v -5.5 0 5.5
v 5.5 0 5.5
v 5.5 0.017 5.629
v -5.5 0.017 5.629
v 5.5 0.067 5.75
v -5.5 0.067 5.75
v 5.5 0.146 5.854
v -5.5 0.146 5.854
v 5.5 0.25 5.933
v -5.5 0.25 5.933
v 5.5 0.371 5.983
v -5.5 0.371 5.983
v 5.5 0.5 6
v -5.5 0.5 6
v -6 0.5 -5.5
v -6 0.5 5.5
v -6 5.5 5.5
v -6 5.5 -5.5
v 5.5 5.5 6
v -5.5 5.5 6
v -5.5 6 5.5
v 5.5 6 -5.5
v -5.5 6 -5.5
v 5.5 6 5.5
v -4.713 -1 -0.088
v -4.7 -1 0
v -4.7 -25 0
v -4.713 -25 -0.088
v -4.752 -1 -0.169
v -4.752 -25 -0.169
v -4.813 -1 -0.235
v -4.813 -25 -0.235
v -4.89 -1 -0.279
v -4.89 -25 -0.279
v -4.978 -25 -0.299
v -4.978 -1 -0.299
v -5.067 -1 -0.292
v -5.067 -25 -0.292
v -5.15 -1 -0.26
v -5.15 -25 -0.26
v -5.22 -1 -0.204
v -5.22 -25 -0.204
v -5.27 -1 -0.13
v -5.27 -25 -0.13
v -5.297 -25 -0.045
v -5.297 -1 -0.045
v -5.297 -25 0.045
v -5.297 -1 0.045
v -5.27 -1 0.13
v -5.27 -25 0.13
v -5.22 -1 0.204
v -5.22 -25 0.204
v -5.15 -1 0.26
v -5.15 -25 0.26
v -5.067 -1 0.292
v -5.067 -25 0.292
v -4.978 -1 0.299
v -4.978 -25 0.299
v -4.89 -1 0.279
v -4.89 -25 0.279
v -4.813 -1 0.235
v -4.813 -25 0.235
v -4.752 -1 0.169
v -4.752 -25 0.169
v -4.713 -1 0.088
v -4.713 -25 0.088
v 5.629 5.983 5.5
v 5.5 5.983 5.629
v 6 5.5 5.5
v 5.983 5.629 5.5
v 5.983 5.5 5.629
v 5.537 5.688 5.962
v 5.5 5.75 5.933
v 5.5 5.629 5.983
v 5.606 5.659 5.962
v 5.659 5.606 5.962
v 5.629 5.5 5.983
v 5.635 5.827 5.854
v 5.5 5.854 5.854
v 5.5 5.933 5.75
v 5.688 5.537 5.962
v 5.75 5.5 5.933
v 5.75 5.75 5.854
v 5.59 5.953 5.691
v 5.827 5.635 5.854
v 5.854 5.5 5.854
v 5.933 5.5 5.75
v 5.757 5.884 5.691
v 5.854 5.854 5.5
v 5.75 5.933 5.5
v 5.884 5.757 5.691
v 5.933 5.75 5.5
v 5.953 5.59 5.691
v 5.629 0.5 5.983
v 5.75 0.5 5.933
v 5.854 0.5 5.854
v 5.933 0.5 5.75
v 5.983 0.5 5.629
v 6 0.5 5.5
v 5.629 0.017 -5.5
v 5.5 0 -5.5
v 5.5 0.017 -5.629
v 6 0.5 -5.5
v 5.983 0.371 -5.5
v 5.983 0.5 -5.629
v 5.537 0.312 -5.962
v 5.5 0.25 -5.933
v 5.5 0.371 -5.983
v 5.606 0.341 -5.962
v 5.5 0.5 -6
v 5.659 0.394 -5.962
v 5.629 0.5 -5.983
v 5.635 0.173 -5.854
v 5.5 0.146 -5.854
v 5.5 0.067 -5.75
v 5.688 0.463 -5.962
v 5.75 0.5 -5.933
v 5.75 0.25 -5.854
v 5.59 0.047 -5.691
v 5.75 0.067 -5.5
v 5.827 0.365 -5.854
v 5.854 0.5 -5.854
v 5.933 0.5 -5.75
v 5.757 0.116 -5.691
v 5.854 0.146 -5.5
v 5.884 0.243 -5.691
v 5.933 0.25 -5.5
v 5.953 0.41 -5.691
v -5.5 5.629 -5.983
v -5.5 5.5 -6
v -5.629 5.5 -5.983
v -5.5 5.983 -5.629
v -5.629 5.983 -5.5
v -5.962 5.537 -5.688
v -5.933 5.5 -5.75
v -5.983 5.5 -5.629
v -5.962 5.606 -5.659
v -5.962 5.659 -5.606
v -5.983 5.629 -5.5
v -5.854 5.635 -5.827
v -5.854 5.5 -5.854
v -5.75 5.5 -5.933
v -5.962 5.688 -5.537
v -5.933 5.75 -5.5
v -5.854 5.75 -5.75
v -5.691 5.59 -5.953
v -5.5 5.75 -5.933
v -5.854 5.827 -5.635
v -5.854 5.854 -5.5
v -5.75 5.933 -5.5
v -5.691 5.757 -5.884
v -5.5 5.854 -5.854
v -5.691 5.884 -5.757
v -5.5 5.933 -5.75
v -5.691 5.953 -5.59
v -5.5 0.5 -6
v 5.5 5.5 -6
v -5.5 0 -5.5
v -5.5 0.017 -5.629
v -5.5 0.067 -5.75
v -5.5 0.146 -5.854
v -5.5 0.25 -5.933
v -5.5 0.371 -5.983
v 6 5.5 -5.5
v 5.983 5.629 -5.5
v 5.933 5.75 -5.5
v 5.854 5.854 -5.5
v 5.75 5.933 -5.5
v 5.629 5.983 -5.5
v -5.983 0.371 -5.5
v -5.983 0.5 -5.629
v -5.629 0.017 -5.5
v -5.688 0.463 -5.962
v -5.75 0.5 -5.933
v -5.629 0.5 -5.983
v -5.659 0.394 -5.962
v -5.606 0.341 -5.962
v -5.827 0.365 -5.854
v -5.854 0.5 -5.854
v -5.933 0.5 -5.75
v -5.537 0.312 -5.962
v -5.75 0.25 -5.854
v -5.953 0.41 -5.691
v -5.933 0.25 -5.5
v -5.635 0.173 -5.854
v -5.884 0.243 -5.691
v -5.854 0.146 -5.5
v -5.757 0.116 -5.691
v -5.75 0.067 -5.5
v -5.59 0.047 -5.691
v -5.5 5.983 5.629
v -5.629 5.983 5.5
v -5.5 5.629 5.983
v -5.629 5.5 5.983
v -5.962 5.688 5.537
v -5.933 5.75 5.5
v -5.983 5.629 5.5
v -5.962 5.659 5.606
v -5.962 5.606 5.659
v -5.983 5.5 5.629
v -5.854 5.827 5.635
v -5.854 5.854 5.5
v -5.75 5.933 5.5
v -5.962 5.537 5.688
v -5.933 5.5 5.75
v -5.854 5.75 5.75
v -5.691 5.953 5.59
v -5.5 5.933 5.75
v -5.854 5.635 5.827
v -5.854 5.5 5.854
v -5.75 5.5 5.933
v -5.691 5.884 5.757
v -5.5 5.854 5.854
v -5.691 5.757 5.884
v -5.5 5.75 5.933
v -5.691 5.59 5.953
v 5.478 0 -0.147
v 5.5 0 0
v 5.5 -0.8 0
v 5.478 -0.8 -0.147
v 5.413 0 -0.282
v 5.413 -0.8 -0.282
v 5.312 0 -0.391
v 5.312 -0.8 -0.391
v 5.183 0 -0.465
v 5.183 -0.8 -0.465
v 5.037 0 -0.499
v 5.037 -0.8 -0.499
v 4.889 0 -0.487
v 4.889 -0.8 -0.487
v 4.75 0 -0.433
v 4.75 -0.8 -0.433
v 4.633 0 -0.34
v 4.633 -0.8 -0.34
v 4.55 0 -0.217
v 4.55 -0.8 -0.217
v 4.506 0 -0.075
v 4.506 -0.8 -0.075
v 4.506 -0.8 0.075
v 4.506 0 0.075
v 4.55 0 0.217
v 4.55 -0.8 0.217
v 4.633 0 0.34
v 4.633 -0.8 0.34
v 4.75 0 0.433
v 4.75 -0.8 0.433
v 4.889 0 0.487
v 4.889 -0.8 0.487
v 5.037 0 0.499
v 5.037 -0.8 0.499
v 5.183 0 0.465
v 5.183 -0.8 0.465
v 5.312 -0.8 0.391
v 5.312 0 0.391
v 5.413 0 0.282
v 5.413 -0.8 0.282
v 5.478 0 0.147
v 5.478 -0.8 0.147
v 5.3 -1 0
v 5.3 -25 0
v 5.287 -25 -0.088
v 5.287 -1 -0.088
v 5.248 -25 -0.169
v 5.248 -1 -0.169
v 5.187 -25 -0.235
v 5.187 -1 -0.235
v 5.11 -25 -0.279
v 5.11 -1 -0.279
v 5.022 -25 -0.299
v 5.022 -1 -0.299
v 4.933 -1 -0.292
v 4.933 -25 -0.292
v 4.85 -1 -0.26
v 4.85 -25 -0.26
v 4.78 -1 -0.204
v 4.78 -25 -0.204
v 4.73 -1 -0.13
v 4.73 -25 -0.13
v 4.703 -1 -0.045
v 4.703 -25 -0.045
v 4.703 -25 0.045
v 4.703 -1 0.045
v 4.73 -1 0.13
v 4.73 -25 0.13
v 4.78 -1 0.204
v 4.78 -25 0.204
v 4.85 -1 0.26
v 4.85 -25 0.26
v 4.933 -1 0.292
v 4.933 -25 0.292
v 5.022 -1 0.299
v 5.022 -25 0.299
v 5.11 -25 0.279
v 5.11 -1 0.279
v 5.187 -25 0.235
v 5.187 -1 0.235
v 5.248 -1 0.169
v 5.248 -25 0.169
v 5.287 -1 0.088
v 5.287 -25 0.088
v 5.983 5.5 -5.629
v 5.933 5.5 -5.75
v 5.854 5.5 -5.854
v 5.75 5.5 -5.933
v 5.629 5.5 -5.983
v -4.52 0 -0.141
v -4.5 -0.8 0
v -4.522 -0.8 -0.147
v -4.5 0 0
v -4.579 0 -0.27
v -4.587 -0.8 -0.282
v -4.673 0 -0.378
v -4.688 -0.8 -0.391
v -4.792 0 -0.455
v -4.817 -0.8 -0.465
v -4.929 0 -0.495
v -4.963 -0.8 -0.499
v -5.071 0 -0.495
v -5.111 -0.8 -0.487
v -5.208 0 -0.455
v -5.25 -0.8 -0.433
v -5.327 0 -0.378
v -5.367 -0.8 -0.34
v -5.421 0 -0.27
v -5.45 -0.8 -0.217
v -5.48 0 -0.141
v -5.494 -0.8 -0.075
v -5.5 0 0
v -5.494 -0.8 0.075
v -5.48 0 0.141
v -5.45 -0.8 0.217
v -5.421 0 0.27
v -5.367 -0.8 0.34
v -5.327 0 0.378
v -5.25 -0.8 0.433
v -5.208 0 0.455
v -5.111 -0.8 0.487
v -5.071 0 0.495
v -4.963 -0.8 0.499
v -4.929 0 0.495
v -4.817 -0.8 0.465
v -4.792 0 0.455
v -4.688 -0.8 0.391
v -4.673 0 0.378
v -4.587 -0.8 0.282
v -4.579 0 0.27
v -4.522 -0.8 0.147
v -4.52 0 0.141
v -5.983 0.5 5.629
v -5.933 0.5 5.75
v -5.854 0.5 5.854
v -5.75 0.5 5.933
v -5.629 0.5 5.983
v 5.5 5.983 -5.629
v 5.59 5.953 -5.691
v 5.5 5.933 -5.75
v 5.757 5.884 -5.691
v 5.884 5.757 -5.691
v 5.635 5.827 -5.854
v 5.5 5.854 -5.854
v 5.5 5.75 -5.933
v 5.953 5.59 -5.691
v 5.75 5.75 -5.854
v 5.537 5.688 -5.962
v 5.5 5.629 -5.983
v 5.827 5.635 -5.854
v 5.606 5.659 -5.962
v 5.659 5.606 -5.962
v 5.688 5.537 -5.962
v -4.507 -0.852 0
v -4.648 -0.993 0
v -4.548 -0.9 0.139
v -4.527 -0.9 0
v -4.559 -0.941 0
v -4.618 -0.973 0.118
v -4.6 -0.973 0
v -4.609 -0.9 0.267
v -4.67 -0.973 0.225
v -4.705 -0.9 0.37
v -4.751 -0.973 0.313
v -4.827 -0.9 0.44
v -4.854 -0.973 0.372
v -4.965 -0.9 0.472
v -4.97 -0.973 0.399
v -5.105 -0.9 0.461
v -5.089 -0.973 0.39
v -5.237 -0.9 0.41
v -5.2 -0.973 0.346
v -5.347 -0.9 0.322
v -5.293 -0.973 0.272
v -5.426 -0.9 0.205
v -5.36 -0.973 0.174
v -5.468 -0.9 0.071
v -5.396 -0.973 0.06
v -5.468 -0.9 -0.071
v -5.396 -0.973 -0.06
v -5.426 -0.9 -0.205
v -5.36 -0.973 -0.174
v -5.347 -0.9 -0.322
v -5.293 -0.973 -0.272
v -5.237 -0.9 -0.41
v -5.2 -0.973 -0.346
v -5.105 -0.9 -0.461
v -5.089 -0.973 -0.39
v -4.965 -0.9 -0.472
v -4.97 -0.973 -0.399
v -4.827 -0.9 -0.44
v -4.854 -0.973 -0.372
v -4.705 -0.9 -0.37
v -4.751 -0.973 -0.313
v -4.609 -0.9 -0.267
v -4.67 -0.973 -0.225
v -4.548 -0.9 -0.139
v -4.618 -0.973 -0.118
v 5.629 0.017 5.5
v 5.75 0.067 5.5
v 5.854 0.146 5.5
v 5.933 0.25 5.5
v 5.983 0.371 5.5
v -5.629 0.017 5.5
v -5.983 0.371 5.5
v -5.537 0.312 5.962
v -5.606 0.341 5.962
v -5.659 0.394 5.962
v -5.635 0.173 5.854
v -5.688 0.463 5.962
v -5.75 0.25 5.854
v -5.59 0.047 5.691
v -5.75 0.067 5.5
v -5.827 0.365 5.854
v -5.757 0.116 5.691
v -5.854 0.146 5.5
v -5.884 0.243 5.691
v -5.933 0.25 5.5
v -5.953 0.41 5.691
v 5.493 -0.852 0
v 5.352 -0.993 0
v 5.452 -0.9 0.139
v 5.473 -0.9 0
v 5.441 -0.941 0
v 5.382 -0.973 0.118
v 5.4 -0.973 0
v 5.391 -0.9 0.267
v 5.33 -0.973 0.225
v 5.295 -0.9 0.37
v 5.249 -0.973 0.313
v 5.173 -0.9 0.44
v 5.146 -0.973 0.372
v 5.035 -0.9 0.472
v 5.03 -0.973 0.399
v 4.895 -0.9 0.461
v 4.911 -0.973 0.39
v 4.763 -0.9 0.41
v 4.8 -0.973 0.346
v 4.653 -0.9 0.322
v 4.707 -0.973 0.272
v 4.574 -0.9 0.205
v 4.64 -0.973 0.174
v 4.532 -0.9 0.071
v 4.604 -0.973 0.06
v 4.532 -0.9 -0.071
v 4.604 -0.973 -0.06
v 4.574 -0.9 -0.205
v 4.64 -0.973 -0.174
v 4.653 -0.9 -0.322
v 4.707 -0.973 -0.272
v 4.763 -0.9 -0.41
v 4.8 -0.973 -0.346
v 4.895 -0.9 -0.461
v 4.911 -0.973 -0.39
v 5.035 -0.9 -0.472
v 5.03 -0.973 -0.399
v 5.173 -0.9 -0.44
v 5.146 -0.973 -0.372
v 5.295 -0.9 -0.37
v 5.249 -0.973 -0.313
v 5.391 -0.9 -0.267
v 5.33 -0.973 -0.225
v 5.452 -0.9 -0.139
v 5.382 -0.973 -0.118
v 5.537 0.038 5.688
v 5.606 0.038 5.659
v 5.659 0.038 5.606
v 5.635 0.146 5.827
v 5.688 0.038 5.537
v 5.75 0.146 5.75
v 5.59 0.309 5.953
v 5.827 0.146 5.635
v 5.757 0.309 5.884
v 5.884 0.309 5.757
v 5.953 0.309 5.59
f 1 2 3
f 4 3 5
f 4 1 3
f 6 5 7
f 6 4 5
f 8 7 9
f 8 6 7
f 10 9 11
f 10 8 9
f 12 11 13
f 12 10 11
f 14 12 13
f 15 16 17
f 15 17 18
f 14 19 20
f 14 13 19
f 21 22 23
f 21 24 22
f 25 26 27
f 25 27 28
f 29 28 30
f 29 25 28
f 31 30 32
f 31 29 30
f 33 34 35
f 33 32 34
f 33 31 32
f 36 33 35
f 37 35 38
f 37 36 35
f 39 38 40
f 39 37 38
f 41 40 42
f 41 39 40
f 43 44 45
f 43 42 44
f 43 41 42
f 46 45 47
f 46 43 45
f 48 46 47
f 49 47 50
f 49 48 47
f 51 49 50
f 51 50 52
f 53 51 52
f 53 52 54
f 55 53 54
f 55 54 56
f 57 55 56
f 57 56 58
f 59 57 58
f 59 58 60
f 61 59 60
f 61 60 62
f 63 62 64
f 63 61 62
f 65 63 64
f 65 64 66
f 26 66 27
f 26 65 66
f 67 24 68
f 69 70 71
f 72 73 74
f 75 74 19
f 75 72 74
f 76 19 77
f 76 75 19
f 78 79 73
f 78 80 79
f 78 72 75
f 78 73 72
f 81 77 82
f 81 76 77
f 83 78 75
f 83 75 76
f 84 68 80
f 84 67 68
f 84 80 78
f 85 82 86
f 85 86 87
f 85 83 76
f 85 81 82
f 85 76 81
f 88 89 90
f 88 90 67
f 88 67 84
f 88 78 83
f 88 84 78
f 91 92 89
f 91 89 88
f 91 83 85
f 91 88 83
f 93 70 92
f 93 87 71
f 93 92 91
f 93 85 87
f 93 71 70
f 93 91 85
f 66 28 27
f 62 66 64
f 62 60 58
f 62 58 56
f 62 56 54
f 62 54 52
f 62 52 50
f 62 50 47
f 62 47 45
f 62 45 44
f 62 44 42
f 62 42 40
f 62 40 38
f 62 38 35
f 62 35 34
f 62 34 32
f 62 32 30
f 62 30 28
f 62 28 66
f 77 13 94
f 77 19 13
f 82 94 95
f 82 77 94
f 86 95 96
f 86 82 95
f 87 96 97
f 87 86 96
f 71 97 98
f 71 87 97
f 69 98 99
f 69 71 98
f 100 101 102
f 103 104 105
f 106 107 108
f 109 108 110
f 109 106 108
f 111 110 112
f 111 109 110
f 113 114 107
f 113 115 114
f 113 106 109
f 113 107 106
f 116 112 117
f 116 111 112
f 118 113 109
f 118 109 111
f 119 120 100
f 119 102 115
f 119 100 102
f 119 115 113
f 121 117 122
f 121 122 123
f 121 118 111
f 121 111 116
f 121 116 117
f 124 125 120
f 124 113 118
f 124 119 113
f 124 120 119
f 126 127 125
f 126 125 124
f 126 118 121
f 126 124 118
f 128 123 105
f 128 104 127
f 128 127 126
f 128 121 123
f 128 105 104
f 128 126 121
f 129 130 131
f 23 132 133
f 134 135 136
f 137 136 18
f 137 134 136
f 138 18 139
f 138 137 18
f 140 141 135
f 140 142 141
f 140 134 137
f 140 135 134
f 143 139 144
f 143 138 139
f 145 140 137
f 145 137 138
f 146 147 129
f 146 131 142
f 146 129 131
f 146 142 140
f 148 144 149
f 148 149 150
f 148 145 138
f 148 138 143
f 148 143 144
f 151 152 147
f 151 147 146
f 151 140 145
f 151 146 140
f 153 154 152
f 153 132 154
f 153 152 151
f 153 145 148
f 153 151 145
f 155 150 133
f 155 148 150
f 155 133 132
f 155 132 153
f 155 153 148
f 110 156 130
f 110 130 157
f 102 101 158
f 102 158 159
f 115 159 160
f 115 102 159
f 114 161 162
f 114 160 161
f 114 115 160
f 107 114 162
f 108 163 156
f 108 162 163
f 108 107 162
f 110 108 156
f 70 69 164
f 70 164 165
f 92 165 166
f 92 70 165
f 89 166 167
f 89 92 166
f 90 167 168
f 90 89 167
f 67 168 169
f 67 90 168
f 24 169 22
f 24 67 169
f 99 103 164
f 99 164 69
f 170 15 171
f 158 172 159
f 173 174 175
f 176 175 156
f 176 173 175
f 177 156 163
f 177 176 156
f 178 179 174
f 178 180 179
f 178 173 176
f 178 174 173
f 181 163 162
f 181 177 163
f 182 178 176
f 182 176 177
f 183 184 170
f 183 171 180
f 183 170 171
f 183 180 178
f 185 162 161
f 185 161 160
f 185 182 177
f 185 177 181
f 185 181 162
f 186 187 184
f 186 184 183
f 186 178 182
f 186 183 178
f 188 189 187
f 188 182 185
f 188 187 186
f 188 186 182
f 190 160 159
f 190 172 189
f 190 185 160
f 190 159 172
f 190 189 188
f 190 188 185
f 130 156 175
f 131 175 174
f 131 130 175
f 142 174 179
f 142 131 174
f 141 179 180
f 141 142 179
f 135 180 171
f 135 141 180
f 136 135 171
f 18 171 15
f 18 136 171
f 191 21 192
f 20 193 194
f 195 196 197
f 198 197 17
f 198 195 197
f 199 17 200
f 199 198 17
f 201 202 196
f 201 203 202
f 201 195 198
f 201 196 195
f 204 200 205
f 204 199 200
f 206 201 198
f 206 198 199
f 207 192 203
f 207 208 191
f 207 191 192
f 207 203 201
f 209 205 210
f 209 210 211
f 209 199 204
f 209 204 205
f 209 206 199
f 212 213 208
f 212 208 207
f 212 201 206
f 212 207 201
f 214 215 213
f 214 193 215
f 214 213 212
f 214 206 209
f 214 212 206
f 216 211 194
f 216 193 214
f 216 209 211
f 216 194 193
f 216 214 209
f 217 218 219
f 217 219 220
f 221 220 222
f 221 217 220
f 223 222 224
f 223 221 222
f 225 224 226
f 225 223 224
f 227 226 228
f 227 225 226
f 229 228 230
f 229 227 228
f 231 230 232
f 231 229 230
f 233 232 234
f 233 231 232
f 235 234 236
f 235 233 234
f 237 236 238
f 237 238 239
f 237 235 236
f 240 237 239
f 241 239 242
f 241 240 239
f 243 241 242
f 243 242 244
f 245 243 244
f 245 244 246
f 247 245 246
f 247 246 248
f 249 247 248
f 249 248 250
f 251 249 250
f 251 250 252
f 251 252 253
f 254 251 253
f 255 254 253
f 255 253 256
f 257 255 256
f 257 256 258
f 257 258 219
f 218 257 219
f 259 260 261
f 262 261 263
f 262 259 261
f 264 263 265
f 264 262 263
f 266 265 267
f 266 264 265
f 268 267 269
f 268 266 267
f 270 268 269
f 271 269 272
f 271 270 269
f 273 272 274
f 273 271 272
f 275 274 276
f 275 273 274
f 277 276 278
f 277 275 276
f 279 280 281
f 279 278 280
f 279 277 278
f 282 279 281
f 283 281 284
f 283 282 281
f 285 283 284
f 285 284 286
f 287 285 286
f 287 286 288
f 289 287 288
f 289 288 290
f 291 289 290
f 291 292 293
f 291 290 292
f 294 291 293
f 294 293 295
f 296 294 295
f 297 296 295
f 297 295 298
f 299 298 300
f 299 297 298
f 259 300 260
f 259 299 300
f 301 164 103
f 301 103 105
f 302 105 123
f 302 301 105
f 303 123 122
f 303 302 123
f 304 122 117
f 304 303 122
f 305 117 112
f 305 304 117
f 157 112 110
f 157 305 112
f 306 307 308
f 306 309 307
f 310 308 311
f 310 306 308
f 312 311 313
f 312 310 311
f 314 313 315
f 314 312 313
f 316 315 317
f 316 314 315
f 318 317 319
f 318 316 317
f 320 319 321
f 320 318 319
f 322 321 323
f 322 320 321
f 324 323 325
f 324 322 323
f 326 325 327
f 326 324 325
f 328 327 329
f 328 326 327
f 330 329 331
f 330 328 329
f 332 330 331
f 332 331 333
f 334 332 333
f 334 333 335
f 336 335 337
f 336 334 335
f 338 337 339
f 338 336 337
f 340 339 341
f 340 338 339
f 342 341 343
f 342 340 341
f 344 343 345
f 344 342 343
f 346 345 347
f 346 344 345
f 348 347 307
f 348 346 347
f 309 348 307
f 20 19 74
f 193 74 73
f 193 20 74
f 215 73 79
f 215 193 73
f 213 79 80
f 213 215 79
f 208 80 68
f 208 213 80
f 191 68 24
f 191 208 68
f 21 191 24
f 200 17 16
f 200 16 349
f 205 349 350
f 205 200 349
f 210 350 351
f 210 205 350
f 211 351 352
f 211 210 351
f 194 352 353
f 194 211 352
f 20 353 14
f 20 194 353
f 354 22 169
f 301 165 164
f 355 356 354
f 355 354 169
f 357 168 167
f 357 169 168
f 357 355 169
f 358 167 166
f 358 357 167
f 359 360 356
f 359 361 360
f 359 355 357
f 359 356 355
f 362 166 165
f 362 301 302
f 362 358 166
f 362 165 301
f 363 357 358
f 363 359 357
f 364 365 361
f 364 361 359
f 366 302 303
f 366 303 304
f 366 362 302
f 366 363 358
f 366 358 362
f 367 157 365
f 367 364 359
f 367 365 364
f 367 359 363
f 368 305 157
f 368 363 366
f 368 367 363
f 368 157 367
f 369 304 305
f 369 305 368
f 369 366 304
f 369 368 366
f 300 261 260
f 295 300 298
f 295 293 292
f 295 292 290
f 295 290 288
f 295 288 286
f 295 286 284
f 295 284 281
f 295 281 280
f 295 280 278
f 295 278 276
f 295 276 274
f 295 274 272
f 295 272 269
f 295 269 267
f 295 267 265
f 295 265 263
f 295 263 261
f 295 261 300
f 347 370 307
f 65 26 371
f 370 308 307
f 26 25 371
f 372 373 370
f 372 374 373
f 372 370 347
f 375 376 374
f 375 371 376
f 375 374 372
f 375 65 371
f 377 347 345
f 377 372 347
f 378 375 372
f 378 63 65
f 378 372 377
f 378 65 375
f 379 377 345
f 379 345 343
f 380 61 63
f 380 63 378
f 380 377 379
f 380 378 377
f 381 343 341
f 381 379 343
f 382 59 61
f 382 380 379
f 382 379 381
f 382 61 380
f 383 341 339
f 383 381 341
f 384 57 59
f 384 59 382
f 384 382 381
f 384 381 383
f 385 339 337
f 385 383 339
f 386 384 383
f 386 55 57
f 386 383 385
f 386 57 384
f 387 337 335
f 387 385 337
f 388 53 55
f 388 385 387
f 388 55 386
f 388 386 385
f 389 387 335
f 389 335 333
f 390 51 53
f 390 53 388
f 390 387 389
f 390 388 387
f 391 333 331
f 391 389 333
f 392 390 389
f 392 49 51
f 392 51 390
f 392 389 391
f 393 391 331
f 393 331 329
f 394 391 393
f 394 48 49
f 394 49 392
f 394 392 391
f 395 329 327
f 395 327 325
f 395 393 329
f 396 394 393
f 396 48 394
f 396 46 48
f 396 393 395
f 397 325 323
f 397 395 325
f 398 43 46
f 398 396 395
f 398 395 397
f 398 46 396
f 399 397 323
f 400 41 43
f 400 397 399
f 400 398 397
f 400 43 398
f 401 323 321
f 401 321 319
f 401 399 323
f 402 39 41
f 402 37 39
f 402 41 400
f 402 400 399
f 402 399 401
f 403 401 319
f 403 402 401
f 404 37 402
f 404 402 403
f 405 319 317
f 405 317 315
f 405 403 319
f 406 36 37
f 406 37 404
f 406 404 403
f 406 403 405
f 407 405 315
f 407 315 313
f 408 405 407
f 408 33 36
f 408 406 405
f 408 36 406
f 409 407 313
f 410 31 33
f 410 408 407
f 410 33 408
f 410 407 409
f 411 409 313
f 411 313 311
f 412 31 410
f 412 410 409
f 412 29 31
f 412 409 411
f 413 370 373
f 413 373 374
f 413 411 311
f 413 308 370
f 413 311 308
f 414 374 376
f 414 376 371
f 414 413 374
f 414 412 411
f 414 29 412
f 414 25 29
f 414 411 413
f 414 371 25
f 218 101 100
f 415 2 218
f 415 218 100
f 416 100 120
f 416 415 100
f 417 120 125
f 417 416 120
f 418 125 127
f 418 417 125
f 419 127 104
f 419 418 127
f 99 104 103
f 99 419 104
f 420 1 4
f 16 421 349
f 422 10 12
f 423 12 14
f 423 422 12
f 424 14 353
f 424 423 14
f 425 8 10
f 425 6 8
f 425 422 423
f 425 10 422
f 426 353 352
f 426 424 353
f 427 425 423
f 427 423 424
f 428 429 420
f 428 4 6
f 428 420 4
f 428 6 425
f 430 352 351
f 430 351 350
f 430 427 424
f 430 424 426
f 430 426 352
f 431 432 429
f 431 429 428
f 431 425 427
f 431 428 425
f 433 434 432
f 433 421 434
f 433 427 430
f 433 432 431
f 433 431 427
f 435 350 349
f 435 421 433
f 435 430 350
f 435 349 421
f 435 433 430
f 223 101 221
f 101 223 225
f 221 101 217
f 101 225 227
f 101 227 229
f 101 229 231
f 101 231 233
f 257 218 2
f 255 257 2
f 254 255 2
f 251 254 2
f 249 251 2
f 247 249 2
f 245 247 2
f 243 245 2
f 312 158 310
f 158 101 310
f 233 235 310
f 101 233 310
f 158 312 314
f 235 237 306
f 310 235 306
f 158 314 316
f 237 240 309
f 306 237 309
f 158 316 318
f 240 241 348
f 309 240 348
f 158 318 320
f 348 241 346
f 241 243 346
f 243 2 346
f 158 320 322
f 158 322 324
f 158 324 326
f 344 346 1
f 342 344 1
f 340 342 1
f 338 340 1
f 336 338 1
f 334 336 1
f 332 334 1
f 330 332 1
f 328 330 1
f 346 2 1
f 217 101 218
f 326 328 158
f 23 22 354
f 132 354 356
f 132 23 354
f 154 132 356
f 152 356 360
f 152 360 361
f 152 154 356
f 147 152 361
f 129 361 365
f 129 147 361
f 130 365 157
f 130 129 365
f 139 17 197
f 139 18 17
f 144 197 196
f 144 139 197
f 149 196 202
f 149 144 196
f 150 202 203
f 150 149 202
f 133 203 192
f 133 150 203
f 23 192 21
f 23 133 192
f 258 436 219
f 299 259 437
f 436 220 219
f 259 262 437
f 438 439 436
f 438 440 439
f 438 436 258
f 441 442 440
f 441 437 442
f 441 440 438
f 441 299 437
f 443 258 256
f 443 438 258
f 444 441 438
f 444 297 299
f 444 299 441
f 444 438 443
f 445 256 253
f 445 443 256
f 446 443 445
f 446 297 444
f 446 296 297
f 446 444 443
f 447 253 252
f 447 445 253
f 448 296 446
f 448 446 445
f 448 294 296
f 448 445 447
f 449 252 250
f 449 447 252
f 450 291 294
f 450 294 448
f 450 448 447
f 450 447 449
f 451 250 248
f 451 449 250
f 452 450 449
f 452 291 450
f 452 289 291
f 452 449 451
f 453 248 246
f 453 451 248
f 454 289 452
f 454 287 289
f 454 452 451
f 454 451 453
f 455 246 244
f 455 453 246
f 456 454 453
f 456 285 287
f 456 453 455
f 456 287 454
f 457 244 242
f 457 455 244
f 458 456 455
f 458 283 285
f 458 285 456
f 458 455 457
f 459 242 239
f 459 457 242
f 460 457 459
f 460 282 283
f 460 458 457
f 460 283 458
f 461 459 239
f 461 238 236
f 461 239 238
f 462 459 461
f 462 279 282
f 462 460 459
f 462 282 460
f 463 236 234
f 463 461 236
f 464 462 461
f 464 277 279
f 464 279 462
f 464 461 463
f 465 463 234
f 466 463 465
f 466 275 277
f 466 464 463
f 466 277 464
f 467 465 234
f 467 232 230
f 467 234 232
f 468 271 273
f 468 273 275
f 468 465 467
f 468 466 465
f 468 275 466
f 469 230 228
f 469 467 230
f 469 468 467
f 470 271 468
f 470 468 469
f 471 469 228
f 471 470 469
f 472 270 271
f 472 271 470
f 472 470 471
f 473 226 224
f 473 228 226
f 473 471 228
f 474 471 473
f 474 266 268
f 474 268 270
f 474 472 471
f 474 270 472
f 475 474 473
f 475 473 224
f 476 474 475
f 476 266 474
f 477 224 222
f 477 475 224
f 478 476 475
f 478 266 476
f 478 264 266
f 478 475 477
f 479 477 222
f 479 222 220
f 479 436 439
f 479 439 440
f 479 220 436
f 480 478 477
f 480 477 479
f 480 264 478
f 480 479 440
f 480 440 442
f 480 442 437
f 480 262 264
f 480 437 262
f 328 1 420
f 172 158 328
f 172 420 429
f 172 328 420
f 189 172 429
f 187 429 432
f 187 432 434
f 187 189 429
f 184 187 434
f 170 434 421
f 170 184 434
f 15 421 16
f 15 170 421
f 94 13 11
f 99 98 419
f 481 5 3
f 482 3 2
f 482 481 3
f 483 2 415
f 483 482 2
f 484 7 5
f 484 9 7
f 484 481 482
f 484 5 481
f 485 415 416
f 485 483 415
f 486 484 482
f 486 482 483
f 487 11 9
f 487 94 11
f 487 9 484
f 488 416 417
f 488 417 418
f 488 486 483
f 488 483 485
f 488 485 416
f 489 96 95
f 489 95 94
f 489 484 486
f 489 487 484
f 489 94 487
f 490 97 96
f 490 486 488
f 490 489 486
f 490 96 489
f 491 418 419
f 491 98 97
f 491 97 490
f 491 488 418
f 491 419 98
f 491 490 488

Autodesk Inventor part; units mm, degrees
ref_plane "YZ Plane" through (0, 0, 0) normal (1, 0, 0) x (0, 1, 0)
ref_plane "XZ Plane" through (0, 0, 0) normal (0, 1, 0) x (-1, 0, 0)
ref_plane "XY Plane" through (0, 0, 0) normal (0, 0, 1) x (1, 0, 0)
sketch "Эскиз7" plane through (0, 0, 0) normal (0, 1, 0) x (-1, 0, 0)
  line L0 (-6, 6) -> (6, 6)
  line L1 (6, 6) -> (6, -6)
  line L2 (6, -6) -> (-6, -6)
  line L3 (-6, -6) -> (-6, 6)
  line L4 (-6, 6) -> (6, -6) construction
  line L5 (6, 6) -> (-6, -6) construction
  point P0 (0, 0)
  dimension "d12" = 12
  dimension "d13" = 12
extrude "Выдавливание2" add sketch "Эскиз7" along normal blind 6
fillet "Сопряжение1" radius 0.5 1 edges at (6, 6, 0)
fillet "Сопряжение2" radius 0.5 13 edges at (6, 2.75, 6) (5.8536, 5.8536, 6) (-0.25, 6, 6) (-6, 0, 0) (6, 0, 0) (5.8536, 5.8536, -6) (-0.25, 6, -6) (6, 2.75, -6) (-6, 3, -6) (-6, 6, 0) (0, 0, 6) (-6, 3, 6) (0, 0, -6)
sketch "Эскиз8" plane through (0, 0, 0) normal (0, -1, 0) x (1, 0, 0)
  line L0 (0, 0) -> (-5, 0)
  line L1 (0, 0) -> (5, 0)
  circle A0 centre (-5, 0) radius 0.5
  circle A1 centre (5, 0) radius 0.5
  line L2 (5.5, -5.5) -> (5.5, 5.5) projected
  dimension "d18" = 5
  dimension "d19" = 5
extrude "Выдавливание3" add sketch "Эскиз8" along normal blind 1
fillet "Сопряжение3" radius 0.2 1 edges at (-5.5, -1, 0)
fillet "Сопряжение4" radius 0.2 1 edges at (4.5, -1, 0)
sketch "Эскиз10" plane through (-5, -1, 0) normal (0, -1, 0) x (1, 0, 0)
  circle A0 centre (0, 0) radius 0.3
  point P0 (5, 0)
extrude "Выдавливание4" add sketch "Эскиз10" along normal blind 24
sketch "Эскиз11" plane through (5, -1, 0) normal (0, -1, 0) x (1, 0, 0)
  circle A0 centre (0, 0) radius 0.3 projected
  circle A1 centre (0, 0) radius 0.3
  point P0 (-5, 0)
extrude "Выдавливание5" add sketch "Эскиз11" along normal blind 24
equation "\"Радиус_гибки\" = Толщина"
equation "\"Ширина_просечки\" = Толщина"
equation "\"Глубина_просечки\" = 0.5 * Толщина"
equation "\"Размер_просечки\" = 4 * Толщина"
equation "\"Мин_остаток\" = 2 * Толщина"
equation "\"Радиус_перехода\" = Радиус_гибки"
equation "\"Радиус_Якоби\" = Радиус_гибки"
equation "\"Размер_зазора\" = Толщина"
equation "\"Толщина\" = 0.5"
